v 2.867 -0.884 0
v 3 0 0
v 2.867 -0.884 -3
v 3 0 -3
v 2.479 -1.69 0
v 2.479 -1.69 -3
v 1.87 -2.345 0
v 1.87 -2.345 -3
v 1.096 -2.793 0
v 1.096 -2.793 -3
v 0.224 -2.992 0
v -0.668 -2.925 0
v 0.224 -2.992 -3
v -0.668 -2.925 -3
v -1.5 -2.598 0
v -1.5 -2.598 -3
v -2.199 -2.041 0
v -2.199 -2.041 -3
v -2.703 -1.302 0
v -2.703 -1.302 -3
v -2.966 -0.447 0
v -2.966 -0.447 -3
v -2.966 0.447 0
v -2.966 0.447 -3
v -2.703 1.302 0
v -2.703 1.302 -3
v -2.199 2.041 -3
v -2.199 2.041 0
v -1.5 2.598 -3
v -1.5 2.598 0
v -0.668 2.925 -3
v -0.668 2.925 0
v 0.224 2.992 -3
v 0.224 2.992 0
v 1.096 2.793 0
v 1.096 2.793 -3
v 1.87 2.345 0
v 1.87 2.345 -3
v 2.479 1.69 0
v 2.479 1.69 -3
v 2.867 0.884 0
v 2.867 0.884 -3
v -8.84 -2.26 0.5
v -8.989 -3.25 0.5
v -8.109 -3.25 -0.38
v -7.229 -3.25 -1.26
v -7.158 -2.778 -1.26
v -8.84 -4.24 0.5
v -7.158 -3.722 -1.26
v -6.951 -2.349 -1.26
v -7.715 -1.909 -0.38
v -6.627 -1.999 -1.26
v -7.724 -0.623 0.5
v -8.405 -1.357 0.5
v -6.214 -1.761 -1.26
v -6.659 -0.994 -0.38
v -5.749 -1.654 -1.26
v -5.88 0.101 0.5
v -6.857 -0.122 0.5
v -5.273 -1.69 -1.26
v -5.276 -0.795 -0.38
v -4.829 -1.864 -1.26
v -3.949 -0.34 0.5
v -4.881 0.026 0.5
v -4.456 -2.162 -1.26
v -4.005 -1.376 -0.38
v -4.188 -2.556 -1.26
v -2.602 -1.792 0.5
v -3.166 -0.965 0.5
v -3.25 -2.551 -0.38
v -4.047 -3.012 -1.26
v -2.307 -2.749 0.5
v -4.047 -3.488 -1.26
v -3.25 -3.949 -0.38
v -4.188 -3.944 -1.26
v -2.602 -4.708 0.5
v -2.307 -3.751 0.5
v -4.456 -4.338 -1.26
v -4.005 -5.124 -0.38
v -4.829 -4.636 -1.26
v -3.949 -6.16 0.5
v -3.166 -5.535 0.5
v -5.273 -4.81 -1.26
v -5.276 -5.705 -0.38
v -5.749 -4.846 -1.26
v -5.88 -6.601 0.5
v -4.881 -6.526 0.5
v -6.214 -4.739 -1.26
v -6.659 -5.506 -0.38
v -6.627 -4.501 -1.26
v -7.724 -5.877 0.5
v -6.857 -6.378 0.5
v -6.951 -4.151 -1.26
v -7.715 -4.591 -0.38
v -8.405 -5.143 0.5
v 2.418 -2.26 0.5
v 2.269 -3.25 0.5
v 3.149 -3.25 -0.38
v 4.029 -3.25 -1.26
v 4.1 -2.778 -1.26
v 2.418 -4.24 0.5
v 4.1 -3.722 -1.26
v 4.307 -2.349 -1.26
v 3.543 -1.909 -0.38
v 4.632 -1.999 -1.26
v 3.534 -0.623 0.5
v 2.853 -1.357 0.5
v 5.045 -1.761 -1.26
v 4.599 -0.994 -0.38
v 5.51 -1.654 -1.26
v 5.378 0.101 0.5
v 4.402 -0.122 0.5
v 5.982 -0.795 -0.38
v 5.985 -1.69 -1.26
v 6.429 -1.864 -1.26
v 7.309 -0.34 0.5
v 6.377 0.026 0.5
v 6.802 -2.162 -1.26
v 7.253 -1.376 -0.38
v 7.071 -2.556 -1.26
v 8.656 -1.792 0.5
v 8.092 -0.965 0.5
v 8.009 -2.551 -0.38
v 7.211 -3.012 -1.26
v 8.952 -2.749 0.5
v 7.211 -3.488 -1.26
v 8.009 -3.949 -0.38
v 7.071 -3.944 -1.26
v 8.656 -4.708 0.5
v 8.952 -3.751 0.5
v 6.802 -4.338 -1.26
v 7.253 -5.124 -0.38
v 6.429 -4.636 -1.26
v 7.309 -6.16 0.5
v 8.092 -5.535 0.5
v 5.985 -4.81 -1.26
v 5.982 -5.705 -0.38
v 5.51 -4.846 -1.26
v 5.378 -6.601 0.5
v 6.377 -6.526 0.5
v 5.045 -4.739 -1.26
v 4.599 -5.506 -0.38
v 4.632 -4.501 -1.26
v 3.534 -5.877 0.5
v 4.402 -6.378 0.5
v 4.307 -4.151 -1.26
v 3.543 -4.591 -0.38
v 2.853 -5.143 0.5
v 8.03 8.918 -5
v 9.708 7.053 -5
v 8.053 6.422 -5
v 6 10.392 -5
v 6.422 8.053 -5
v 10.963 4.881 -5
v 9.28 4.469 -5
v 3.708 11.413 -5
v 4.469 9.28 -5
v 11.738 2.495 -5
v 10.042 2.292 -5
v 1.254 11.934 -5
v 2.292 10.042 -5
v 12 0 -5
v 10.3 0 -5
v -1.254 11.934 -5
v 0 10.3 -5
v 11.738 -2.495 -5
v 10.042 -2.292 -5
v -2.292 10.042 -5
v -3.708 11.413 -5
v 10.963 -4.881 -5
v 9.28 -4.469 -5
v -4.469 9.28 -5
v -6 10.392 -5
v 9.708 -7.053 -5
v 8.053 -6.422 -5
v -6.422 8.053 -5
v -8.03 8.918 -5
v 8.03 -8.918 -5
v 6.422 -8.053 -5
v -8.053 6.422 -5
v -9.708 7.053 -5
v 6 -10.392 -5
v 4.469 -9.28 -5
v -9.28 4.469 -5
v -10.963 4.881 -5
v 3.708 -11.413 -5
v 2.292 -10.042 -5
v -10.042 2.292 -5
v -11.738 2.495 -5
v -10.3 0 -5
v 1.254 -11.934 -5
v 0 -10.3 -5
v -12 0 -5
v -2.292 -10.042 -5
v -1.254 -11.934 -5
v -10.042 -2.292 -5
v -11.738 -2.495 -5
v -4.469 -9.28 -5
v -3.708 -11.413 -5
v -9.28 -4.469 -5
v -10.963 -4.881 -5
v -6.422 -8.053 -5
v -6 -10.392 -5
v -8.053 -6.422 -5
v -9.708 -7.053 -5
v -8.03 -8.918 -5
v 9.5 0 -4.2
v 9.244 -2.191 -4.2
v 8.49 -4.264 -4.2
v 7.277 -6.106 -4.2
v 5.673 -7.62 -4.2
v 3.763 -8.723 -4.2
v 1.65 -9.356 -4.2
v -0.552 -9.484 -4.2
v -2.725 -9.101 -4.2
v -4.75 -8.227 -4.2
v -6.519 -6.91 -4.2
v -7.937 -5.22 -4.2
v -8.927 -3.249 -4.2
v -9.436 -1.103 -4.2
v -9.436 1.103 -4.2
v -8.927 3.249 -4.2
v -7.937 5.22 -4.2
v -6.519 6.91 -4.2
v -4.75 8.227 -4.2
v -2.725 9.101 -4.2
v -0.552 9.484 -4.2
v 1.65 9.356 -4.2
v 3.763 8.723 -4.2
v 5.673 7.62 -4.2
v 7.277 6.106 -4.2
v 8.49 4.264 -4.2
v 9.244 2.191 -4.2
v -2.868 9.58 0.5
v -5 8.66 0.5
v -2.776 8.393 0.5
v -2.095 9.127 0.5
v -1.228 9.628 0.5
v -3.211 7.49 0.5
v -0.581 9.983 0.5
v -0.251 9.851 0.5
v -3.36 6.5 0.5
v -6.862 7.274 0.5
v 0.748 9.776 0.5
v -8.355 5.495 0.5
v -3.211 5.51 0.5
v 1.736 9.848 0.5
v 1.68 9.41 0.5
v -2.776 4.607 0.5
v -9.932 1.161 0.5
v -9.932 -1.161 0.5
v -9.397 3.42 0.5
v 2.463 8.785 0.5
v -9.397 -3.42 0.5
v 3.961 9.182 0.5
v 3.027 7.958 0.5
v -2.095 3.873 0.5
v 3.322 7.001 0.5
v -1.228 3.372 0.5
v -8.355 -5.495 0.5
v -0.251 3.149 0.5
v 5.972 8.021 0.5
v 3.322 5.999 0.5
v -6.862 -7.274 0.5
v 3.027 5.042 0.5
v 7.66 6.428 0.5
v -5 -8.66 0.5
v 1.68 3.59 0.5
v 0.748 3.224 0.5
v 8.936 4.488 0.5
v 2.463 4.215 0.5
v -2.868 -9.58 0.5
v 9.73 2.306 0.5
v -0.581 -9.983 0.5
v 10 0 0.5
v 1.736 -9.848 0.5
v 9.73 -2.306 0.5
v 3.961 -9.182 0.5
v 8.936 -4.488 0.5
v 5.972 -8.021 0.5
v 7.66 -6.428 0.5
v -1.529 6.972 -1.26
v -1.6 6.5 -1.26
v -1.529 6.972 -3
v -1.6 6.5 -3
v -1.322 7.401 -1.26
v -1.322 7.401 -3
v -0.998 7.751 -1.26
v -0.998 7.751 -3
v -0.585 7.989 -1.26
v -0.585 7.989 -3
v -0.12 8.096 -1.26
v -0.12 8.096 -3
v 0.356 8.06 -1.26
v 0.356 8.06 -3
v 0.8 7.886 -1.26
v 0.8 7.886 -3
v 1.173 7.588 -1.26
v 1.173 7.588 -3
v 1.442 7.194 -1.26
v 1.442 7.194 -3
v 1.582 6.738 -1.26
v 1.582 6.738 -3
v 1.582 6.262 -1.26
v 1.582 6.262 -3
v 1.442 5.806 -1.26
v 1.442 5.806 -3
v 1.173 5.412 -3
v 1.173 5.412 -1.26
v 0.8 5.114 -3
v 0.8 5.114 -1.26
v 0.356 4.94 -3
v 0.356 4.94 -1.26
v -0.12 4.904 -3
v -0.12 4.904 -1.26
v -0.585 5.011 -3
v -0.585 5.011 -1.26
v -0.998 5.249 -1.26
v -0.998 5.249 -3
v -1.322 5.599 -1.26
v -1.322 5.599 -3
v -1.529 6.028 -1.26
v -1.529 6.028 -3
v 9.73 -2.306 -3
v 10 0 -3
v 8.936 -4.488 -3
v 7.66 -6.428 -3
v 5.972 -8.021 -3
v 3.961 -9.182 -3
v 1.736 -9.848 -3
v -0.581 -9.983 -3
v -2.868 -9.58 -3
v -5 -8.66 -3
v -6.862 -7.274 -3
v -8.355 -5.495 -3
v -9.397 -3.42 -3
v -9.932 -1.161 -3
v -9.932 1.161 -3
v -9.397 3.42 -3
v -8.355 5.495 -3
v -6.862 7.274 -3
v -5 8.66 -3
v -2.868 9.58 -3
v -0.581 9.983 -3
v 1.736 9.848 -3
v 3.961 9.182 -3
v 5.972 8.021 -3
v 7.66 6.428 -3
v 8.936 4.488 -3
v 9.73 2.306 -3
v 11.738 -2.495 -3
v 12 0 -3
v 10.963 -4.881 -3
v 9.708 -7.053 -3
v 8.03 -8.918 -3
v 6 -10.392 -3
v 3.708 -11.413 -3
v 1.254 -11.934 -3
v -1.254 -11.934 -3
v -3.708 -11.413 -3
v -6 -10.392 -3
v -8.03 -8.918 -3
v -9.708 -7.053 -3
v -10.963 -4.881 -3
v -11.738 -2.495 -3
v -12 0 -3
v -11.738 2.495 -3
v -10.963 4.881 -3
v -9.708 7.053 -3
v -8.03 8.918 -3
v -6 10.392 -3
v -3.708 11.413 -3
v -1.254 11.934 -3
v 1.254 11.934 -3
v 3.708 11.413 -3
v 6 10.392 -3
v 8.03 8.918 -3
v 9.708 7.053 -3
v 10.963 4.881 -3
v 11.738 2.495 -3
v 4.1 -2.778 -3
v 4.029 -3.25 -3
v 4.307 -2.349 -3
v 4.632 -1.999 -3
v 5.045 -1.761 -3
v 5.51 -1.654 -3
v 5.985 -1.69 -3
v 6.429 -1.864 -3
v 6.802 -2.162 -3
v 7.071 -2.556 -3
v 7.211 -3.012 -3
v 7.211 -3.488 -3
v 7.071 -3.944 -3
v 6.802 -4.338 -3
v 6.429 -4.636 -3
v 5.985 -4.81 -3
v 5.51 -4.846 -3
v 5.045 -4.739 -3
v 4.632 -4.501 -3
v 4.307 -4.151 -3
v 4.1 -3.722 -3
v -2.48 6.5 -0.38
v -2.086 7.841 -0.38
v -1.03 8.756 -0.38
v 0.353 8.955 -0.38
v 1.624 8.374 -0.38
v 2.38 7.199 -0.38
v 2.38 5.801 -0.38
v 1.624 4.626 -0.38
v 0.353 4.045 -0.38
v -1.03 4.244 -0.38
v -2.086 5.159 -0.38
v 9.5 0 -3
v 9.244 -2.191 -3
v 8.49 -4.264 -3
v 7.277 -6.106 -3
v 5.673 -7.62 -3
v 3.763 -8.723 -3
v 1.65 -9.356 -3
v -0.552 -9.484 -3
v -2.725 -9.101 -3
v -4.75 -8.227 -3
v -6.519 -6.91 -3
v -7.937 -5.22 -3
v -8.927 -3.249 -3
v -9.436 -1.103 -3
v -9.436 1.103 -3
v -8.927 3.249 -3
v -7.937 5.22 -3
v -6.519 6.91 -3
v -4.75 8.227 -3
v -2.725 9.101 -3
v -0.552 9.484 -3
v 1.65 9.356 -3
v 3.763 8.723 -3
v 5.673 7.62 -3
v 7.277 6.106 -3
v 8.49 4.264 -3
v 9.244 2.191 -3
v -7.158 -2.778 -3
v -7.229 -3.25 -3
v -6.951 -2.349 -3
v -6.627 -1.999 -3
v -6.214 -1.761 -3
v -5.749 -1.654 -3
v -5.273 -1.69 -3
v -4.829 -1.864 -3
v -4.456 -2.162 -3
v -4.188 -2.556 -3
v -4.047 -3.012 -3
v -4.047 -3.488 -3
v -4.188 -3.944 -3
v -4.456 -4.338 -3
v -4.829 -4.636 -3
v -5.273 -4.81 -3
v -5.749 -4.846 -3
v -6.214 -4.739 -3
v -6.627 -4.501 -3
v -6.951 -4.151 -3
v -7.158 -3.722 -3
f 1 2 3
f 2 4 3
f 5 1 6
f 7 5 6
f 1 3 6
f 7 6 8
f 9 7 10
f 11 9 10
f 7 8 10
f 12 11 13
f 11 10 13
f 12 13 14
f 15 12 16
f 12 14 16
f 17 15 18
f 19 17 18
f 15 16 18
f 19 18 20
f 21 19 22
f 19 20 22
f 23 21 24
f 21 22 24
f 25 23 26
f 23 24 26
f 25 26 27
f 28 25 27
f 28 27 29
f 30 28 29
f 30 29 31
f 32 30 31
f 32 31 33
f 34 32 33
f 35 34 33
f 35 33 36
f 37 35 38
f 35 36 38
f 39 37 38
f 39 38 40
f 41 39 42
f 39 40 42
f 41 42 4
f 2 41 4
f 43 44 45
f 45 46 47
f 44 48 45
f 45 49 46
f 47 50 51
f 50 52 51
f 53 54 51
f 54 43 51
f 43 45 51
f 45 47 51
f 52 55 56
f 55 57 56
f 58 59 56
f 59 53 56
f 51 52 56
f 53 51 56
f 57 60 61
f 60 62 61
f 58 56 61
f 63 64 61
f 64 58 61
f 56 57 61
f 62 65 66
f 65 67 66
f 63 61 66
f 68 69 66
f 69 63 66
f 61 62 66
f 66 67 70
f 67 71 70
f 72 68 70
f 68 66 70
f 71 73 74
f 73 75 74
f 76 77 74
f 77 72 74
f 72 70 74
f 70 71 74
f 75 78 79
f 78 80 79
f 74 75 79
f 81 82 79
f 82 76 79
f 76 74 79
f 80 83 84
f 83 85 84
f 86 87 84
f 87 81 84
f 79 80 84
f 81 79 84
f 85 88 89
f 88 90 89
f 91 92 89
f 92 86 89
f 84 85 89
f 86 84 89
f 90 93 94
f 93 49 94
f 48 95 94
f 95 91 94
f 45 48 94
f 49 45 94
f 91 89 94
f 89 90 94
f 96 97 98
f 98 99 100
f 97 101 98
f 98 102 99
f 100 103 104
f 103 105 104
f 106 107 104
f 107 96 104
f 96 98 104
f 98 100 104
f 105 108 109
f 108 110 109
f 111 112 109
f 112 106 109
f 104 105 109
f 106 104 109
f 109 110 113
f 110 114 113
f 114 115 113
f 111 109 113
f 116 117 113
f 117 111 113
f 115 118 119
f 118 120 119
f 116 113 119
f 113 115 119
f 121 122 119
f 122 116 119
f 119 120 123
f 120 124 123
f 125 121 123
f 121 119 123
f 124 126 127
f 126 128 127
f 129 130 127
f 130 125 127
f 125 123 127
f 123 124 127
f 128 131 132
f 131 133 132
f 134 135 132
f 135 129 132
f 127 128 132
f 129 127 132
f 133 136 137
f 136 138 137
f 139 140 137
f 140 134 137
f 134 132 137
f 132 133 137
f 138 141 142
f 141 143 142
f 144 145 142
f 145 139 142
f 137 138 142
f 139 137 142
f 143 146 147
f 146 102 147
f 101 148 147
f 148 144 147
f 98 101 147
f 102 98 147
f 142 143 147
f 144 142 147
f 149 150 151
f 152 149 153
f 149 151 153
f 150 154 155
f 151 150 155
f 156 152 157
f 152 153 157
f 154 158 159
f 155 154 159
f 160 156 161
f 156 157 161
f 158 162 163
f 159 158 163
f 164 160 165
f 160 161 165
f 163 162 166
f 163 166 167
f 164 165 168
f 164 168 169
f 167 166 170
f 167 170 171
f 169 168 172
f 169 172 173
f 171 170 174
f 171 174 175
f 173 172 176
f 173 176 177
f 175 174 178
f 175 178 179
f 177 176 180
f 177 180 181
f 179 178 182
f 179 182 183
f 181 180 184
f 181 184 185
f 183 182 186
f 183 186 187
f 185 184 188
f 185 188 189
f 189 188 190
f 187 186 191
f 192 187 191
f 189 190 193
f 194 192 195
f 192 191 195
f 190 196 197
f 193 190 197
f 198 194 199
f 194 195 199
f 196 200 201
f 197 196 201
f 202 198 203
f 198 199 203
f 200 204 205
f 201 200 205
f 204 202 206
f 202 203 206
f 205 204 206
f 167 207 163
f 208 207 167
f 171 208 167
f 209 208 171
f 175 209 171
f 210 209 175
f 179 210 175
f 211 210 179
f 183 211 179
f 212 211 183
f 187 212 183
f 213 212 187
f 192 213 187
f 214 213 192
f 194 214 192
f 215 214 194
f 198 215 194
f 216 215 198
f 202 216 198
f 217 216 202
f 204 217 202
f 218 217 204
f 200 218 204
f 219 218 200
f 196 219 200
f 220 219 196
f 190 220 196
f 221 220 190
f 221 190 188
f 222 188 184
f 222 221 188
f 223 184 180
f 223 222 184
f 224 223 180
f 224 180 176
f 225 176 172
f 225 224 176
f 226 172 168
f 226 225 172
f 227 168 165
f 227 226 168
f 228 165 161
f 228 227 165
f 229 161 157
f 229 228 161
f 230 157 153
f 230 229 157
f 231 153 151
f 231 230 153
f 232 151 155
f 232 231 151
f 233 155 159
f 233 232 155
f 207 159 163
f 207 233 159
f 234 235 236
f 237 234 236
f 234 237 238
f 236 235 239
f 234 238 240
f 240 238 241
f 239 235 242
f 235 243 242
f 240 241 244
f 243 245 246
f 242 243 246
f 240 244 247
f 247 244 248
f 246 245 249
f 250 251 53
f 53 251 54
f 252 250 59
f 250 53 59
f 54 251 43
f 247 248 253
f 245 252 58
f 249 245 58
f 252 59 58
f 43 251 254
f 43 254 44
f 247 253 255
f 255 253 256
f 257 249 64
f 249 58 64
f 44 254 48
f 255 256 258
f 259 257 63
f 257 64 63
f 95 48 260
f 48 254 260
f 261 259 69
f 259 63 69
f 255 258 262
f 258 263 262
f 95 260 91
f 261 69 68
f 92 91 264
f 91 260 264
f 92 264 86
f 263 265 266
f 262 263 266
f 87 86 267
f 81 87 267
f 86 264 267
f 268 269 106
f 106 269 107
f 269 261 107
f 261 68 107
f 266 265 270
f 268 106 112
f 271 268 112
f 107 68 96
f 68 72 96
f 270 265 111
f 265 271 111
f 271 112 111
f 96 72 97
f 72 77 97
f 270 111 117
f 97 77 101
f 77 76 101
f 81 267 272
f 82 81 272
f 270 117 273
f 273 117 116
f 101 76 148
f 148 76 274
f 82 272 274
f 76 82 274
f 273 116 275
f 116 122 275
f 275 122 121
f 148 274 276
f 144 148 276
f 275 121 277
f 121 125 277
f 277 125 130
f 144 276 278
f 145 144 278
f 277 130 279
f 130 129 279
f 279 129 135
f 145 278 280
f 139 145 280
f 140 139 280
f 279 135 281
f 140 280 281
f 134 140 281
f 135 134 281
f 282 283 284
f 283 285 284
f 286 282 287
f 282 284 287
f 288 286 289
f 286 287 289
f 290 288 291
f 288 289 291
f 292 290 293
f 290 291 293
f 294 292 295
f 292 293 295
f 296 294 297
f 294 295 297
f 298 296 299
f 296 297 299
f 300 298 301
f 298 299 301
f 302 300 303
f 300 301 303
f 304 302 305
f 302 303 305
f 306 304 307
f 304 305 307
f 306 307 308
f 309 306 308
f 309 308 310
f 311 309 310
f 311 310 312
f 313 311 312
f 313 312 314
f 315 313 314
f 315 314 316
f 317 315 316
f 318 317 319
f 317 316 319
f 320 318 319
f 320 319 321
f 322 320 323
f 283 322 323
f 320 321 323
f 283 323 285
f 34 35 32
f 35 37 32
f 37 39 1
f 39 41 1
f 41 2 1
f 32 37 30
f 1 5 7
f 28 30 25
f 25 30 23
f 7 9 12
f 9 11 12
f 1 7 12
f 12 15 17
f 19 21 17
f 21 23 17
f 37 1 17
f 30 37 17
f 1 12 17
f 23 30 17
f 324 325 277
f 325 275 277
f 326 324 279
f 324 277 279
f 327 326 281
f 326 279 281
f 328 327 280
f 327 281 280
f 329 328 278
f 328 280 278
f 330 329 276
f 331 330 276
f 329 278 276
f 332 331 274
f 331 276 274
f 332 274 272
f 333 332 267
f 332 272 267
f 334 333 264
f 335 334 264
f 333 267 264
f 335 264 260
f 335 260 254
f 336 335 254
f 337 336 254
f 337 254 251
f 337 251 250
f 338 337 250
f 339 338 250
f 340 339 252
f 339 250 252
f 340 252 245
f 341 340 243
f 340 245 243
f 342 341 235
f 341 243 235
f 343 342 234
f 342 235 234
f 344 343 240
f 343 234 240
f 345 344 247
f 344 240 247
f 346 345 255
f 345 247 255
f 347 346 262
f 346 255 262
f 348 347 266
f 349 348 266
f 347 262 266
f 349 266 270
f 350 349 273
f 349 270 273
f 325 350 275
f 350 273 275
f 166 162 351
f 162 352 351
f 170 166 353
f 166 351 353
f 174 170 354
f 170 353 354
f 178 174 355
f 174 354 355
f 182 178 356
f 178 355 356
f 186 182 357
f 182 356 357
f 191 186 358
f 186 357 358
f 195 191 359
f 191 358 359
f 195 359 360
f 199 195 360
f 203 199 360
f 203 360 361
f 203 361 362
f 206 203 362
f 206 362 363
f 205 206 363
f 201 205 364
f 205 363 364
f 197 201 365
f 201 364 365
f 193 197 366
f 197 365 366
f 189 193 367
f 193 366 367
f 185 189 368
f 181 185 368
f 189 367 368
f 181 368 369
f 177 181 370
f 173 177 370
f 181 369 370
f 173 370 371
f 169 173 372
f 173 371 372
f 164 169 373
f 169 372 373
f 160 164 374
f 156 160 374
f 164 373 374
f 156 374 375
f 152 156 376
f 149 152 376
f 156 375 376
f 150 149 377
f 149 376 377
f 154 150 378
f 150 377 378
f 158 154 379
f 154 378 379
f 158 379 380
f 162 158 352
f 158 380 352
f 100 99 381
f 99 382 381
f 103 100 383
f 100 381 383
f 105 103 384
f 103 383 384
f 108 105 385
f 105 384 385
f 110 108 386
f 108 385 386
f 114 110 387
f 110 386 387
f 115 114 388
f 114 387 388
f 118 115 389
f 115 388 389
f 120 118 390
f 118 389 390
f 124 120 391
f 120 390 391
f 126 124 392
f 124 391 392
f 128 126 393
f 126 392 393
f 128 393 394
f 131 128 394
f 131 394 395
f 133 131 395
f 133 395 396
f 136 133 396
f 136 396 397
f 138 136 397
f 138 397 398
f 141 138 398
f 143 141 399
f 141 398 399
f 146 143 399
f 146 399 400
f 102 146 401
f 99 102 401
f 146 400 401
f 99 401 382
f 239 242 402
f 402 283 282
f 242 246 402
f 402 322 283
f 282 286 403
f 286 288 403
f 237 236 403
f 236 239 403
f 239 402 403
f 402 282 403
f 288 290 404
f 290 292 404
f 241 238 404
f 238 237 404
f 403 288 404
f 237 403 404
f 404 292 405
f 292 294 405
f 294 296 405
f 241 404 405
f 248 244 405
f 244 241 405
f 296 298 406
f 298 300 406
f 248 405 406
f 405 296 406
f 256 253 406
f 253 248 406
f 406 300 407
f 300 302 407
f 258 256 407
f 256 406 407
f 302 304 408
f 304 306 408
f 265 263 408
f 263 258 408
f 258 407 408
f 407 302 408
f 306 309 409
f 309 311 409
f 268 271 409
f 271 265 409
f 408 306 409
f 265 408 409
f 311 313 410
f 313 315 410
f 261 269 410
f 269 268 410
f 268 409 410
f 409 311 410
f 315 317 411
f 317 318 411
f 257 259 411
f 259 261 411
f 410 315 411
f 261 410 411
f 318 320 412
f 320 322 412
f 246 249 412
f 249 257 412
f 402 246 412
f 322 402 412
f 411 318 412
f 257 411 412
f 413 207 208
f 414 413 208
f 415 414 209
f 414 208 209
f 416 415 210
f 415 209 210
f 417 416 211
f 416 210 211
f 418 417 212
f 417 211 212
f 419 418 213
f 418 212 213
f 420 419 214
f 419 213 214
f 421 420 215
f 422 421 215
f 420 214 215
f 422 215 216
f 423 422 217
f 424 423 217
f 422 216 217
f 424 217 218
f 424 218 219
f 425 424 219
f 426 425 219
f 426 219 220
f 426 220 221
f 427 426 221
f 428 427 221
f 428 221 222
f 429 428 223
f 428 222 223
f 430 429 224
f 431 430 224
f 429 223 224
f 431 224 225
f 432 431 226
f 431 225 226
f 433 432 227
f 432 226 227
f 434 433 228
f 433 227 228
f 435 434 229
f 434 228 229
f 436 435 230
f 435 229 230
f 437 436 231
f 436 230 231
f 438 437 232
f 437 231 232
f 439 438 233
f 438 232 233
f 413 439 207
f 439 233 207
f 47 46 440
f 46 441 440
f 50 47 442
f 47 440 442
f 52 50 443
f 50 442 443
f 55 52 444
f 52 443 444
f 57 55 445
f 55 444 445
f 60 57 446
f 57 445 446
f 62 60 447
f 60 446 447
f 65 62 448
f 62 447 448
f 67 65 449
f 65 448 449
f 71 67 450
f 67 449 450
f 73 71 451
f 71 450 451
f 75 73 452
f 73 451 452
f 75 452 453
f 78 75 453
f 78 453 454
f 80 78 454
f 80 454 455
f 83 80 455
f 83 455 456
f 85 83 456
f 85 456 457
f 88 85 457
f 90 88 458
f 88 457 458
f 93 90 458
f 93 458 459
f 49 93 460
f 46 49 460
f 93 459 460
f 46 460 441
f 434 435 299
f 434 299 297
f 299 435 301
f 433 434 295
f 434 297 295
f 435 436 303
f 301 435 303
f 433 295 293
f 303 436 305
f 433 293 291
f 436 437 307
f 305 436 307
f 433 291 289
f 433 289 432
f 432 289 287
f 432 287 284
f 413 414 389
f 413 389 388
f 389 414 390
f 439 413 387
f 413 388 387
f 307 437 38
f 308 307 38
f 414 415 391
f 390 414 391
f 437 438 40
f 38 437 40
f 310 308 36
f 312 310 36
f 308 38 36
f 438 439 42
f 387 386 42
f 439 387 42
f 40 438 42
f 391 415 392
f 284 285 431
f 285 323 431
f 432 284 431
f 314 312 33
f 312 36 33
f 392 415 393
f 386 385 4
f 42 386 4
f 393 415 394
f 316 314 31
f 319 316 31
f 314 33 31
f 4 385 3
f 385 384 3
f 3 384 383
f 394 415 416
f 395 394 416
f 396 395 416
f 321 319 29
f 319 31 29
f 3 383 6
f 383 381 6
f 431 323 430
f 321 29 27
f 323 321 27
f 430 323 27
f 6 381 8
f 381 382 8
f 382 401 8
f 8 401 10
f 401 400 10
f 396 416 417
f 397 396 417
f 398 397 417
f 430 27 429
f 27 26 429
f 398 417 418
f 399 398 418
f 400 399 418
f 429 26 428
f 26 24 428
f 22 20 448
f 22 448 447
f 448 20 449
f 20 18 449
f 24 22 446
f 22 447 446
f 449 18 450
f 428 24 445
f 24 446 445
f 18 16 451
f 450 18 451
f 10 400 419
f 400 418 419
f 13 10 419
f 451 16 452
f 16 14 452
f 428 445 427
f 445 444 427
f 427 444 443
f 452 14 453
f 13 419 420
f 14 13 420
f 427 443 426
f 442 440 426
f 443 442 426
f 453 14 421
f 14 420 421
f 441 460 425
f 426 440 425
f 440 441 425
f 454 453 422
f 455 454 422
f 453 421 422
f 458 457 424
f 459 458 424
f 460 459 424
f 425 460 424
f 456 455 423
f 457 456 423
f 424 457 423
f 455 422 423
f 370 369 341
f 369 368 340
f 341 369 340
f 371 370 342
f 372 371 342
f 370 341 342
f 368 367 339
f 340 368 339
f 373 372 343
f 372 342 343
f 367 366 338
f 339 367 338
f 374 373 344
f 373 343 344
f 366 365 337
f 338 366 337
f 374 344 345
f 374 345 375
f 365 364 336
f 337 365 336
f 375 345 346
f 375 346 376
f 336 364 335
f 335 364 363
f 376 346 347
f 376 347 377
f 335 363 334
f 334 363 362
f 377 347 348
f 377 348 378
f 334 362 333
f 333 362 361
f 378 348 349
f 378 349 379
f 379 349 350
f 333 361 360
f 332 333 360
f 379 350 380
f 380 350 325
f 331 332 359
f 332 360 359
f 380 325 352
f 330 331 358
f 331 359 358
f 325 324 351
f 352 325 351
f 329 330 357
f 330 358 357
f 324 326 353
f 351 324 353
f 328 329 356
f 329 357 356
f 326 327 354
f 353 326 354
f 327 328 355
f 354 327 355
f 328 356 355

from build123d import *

# Parameters (mm, degrees)
CSK_FOR_M3_SFHCS1_D           = 3.2
CSK_FOR_M3_SFHCS1_CSINK_D     = 6.72
CSK_FOR_M3_SFHCS1_CSINK_ANGLE = 90
CHAMFER1_SIZE                 = 0.8


with BuildPart() as part:
    # Sketch1 → Revolve1 (revolve)
    with BuildSketch(Plane(origin=(0, 0, 0), x_dir=(1, 0, 0), z_dir=(0, 1, 0))):
        Polygon((0, 0), (3, 0), (3, 3), (9.5, 3), (9.5, 5), (12, 5), (12, 3), (10, 3), (10, -0.5), (0, -0.5), align=None)
    revolve(axis=Axis((0, 0, 0), (0, 0, -1)))

    # CSK for M3 SFHCS1 (through all)
    with Locations(Plane.XY.offset(0.5)):
        with Locations((0, 6.5), (5.629165125, -3.25), (-5.629165125, -3.25)):
            CounterSinkHole(CSK_FOR_M3_SFHCS1_D / 2, CSK_FOR_M3_SFHCS1_CSINK_D / 2, counter_sink_angle=CSK_FOR_M3_SFHCS1_CSINK_ANGLE)

    # Chamfer1
    chamfer1_edges = [part.edges().sort_by_distance(p)[0] for p in [
        (-9.5, 0, -5),
    ]]
    chamfer(chamfer1_edges, length=CHAMFER1_SIZE)


solid = part.part
